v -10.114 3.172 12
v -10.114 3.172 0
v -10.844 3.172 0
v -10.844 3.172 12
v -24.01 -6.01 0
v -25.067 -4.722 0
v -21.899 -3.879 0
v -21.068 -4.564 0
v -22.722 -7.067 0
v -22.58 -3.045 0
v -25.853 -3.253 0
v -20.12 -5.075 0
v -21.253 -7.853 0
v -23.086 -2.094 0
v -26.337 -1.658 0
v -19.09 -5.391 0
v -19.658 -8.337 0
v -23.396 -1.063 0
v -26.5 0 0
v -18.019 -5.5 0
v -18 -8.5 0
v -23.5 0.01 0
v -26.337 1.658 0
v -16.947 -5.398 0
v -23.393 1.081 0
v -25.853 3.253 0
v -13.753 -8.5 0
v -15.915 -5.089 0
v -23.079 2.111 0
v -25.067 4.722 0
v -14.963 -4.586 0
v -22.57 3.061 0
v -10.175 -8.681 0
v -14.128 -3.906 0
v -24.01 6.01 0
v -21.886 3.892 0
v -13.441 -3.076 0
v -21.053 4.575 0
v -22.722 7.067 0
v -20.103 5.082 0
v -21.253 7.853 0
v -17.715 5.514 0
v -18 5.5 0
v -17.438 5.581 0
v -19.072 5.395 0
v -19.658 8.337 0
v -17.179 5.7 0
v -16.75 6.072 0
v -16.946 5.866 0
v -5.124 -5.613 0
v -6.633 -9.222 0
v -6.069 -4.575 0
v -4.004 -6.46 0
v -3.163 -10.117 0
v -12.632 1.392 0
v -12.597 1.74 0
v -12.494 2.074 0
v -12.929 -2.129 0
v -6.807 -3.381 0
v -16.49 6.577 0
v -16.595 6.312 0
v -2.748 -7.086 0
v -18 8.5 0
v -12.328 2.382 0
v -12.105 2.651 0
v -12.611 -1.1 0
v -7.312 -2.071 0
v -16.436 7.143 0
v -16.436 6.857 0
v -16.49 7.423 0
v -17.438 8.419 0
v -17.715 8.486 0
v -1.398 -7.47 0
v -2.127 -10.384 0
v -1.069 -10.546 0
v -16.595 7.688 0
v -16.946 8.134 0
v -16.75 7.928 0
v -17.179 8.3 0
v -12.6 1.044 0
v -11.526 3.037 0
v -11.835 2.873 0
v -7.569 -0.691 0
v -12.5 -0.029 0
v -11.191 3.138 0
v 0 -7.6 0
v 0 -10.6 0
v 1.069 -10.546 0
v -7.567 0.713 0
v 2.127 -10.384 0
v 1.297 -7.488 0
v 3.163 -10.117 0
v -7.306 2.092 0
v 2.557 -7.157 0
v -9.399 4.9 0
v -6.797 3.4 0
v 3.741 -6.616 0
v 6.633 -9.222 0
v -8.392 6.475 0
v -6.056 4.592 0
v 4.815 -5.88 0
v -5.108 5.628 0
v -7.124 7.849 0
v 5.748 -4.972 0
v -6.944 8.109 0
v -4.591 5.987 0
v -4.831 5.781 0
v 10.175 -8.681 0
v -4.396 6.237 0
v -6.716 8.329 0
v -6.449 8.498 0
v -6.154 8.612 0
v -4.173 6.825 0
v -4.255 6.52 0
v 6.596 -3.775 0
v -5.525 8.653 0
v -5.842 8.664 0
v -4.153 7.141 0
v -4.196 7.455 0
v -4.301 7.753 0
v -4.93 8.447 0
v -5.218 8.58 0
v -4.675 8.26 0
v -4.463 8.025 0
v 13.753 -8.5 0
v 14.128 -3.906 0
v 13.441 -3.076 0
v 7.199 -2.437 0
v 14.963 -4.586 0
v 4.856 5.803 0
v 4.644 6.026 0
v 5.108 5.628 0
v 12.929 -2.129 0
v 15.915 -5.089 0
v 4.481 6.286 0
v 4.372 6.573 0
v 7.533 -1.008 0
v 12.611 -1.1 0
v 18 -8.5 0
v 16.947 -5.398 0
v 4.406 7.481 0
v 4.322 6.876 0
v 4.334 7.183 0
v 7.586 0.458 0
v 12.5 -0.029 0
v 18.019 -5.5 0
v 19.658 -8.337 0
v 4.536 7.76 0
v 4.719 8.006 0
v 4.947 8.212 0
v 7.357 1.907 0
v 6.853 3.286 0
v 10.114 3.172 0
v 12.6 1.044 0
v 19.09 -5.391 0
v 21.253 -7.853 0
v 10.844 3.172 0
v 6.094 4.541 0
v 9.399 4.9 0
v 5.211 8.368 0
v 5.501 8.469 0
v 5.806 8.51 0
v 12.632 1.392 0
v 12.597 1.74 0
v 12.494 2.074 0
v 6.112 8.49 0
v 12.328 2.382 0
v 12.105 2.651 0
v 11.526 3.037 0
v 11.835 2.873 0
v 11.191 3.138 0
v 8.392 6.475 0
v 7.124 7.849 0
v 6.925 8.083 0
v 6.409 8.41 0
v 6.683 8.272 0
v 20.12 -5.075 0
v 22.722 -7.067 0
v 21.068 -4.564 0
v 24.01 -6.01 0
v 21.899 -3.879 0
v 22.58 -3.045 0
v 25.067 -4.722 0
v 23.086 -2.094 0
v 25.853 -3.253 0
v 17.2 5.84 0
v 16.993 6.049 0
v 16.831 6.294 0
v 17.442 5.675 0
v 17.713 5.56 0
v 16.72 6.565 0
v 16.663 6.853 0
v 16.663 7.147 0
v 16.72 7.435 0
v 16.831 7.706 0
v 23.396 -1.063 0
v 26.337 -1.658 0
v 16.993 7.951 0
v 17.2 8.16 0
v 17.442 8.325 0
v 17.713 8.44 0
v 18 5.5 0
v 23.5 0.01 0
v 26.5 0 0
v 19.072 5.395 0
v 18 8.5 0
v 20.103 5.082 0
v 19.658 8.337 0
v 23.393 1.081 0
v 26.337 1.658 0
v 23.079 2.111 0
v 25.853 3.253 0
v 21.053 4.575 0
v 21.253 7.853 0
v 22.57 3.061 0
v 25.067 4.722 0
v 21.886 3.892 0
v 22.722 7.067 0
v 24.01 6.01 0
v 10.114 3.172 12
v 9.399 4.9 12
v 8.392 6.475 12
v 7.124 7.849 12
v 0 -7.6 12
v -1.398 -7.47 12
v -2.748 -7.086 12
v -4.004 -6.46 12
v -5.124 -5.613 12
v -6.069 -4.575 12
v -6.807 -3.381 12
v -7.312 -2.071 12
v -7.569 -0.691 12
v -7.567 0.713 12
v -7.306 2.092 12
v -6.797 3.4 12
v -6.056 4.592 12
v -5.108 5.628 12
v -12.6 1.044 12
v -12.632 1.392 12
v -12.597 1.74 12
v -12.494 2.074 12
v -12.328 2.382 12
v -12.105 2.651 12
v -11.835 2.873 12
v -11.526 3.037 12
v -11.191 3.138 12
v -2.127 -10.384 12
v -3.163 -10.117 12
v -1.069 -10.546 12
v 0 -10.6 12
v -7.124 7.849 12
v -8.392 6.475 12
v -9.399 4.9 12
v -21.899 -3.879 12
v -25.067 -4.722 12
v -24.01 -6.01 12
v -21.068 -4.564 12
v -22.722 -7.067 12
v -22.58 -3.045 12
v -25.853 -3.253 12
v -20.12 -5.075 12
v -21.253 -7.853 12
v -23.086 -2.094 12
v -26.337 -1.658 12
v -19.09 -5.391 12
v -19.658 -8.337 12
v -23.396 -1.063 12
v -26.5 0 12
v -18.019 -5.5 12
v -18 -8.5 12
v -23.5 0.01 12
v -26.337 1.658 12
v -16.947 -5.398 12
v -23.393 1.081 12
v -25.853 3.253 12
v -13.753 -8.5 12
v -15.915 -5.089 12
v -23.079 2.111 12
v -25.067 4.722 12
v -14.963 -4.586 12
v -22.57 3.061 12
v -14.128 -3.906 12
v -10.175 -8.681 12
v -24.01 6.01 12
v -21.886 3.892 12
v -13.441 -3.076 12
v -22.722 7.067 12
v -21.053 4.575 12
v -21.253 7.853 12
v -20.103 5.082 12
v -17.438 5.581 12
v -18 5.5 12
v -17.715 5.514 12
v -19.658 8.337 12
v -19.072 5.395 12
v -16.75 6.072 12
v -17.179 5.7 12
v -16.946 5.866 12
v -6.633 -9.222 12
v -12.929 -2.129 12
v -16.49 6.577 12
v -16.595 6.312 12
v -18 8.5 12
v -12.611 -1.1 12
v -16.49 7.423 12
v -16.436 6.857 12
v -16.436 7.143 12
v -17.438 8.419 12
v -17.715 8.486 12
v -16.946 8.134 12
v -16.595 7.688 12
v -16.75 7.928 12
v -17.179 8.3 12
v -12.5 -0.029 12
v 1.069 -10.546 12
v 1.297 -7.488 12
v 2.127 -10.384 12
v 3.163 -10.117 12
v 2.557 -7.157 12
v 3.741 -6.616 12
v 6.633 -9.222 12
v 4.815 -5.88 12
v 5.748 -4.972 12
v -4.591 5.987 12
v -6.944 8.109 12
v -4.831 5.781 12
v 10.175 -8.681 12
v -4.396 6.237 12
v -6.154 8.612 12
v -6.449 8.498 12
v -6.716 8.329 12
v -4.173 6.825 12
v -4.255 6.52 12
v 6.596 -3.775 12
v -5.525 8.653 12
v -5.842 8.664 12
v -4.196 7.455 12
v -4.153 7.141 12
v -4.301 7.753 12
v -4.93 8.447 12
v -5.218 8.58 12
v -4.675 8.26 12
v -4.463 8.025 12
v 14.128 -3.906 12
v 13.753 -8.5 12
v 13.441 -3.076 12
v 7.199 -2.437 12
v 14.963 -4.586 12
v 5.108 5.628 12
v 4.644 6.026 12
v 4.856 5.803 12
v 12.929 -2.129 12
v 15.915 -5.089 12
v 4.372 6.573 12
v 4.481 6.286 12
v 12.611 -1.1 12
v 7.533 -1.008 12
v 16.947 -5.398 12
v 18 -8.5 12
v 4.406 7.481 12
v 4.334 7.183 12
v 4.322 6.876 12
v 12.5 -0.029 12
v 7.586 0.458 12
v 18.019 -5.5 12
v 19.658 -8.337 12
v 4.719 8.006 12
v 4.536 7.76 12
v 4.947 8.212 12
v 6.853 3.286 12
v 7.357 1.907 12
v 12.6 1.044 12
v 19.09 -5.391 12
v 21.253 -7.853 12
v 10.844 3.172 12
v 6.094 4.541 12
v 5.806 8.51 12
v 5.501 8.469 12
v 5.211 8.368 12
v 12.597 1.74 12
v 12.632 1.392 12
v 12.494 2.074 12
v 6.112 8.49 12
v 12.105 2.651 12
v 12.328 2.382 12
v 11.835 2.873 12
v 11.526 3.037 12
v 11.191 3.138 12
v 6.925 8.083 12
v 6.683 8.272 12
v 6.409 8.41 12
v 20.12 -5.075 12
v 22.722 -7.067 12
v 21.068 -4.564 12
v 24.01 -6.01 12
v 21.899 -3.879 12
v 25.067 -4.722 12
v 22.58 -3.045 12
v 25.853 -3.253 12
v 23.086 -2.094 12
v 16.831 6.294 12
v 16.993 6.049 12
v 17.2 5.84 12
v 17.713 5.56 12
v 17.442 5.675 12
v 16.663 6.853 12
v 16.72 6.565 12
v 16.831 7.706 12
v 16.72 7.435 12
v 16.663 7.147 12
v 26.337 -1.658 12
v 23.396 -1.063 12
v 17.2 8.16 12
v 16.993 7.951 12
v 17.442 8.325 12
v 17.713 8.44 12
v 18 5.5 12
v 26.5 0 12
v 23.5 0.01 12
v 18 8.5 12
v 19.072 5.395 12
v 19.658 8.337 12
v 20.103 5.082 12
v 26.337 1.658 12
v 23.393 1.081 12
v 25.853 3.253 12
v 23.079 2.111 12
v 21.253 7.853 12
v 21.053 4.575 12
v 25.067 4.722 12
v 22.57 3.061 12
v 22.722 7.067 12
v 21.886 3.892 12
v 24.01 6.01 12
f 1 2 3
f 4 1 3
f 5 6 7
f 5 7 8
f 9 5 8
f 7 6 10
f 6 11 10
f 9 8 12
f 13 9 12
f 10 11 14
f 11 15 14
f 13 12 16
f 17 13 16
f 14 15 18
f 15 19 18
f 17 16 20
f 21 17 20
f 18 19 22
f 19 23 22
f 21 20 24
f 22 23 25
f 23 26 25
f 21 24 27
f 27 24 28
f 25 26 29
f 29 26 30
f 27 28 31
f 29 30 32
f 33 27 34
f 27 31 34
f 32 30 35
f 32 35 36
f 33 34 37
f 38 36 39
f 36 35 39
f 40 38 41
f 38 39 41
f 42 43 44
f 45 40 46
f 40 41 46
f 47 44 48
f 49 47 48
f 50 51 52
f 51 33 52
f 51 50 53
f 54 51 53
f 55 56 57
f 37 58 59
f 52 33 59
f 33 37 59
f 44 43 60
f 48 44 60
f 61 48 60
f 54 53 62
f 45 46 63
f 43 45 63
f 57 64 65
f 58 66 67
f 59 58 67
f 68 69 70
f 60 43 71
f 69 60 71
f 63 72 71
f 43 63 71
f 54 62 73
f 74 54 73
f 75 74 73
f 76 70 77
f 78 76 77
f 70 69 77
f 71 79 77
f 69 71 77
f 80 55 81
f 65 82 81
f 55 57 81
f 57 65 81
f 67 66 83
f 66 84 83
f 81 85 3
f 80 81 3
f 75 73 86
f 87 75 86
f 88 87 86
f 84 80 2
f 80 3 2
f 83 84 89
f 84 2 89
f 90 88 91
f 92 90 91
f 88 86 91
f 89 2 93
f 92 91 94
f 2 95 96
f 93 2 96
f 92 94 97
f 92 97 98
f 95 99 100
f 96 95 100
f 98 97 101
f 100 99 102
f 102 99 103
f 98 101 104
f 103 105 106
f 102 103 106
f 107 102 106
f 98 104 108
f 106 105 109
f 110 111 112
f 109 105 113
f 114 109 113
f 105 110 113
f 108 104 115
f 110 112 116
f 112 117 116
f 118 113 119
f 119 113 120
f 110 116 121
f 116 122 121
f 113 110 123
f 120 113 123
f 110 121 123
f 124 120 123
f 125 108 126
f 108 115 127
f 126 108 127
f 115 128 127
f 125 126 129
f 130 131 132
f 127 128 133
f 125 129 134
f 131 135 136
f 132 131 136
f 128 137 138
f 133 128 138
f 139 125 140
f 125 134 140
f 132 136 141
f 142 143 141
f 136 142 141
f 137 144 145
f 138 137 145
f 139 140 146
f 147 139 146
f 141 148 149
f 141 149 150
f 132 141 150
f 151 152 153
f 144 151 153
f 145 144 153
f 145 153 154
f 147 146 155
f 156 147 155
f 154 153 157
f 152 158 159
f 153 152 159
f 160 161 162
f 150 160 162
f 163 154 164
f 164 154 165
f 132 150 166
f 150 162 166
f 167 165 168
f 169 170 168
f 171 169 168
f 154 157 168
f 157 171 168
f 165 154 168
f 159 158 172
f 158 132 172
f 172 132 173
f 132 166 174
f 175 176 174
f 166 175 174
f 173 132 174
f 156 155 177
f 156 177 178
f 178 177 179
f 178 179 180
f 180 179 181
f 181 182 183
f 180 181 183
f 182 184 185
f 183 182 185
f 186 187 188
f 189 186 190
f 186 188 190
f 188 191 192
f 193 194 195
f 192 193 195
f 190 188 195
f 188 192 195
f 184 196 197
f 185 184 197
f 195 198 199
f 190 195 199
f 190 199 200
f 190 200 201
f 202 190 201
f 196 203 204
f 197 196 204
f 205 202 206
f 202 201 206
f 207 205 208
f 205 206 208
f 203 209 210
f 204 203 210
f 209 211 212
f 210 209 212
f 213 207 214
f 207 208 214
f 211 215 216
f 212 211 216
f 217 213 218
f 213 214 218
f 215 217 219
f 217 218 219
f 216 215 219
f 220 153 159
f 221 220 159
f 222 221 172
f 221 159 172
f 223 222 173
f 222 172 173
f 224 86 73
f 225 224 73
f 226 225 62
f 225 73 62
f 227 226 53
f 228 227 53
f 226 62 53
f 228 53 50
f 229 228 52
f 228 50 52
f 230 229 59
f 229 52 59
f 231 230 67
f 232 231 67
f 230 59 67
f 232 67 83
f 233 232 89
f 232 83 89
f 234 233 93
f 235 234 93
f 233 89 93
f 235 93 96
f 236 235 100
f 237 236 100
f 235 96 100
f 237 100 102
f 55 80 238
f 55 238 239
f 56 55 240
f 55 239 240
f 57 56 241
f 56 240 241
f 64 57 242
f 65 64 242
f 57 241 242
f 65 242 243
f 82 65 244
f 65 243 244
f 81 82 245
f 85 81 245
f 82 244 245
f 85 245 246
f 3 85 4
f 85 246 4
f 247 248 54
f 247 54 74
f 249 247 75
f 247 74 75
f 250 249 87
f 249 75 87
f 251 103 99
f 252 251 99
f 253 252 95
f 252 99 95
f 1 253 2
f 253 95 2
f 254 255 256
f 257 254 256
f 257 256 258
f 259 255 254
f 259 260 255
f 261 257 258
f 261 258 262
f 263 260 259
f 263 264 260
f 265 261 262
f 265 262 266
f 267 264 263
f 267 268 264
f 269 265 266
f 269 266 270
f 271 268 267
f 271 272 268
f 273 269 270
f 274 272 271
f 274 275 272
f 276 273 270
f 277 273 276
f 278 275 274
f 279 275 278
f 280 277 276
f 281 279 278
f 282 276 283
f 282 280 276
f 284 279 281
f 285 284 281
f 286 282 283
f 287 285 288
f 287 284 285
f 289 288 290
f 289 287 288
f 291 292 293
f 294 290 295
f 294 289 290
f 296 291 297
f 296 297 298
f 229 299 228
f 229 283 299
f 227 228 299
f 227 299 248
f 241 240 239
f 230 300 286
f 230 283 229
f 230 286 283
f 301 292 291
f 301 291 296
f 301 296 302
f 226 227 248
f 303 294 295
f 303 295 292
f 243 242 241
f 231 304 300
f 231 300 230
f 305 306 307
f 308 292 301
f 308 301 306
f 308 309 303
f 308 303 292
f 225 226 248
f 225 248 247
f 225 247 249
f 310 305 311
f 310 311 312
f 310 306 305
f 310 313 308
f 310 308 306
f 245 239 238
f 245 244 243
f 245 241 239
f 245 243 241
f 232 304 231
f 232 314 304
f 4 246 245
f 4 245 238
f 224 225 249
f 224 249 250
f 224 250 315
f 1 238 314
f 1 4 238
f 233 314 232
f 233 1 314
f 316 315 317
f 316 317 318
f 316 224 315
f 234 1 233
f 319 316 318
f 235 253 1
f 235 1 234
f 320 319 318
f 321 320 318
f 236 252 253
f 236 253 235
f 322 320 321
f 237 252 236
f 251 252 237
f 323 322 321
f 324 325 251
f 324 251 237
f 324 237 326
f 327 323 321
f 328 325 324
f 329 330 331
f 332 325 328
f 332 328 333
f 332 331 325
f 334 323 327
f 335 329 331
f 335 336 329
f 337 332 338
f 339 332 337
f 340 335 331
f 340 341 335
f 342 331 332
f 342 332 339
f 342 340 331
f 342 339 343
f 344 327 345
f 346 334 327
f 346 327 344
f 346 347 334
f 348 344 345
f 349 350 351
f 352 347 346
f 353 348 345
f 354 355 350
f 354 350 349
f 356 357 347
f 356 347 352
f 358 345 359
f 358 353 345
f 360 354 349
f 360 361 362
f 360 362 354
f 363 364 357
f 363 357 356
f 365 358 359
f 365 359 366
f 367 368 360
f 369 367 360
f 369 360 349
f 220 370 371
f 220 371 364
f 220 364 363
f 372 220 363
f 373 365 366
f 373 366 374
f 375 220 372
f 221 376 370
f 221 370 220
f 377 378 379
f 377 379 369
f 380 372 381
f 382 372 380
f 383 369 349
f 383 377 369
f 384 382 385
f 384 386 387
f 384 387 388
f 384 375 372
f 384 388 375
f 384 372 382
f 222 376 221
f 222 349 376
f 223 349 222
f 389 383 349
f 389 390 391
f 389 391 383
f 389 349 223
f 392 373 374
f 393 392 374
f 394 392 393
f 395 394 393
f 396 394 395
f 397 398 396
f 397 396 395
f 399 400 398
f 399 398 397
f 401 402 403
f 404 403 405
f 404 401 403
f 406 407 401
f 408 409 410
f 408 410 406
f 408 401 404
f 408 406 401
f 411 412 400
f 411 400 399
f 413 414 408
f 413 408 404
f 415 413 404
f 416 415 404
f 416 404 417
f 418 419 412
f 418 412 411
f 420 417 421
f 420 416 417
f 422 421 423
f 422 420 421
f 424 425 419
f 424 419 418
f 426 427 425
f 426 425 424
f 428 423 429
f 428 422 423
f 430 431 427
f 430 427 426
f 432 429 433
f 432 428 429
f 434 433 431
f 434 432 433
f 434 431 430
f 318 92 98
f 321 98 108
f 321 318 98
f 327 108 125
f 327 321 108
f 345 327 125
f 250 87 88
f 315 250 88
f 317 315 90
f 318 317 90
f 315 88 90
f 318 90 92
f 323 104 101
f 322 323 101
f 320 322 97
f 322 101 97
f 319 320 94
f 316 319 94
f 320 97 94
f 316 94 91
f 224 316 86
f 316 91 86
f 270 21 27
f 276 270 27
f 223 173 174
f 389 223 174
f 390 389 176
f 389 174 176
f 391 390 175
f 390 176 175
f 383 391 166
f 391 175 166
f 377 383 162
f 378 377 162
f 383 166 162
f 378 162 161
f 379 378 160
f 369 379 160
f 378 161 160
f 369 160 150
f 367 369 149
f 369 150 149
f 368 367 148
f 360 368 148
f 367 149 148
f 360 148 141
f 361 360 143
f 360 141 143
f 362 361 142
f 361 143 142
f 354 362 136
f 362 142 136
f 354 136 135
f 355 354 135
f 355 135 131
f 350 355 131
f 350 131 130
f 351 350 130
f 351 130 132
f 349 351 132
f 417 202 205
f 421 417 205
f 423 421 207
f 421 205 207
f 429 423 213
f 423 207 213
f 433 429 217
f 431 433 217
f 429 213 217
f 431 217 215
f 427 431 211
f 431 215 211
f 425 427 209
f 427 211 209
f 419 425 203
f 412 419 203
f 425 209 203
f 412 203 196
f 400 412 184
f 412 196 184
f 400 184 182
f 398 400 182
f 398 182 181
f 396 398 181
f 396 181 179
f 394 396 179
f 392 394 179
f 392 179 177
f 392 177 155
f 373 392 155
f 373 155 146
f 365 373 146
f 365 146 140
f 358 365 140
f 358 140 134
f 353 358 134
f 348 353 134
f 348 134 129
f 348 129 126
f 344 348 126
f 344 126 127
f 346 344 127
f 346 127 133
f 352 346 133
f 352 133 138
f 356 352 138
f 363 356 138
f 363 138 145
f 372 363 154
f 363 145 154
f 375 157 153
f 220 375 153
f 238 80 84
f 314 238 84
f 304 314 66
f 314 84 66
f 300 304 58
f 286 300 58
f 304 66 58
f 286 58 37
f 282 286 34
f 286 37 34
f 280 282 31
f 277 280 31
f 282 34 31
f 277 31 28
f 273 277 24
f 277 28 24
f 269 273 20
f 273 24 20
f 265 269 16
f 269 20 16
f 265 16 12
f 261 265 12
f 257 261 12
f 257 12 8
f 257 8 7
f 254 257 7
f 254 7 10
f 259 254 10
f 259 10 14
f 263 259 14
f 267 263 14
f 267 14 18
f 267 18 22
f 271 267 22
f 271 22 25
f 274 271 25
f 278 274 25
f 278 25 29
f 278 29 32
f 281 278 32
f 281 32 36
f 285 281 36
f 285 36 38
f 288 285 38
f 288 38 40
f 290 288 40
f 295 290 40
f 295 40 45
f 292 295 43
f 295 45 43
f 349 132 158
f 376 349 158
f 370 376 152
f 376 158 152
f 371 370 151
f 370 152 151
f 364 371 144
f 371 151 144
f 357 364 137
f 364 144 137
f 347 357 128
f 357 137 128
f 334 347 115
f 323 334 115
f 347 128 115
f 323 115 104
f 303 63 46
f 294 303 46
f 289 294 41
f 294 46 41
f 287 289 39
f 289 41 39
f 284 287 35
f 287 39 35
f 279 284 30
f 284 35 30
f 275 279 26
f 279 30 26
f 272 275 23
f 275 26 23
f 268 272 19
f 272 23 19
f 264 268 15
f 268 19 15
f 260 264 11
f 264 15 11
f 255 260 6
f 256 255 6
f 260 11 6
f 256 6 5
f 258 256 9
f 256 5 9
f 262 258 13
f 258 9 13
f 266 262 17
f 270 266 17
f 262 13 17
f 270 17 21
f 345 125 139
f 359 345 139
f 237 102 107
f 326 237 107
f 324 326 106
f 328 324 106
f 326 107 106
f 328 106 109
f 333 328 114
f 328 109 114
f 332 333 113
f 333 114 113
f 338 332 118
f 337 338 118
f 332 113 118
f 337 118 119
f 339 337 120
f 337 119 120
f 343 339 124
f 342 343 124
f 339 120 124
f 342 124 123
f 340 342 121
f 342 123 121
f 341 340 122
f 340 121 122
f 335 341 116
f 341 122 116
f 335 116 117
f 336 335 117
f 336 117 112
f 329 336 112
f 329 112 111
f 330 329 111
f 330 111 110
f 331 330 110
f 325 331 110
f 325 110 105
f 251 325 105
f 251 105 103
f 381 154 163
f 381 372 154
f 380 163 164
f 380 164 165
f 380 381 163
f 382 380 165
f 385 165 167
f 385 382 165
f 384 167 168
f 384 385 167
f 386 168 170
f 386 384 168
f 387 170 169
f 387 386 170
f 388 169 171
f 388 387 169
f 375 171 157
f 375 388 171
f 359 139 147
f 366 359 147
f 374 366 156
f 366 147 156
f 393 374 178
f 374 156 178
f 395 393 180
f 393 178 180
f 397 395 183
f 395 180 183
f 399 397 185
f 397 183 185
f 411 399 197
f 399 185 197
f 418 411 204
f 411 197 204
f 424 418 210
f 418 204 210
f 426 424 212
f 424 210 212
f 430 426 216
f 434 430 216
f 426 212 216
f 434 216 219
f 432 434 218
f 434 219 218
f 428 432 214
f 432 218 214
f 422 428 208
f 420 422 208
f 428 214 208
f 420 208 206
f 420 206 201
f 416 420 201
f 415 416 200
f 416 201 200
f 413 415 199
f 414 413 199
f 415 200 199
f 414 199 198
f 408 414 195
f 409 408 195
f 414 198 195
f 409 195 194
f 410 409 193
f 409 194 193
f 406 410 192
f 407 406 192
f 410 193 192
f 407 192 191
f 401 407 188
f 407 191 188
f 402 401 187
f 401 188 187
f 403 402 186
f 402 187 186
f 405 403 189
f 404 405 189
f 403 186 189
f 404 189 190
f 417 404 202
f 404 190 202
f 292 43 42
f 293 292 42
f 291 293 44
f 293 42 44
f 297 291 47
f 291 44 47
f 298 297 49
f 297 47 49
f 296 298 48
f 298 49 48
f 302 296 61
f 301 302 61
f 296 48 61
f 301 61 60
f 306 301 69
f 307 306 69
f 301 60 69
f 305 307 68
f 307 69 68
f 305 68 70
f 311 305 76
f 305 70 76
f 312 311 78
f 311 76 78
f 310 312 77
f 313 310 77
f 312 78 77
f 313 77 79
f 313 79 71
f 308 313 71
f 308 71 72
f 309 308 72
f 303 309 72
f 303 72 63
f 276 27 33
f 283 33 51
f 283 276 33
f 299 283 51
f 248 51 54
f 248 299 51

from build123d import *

# Parameters (mm, degrees)
F1_DEPTH = 12
F2_R     = 35.487136
F3_R     = 1.788944


with BuildPart() as f1:
    # F0 (on Top) → F1 (new body)
    with BuildSketch(Plane.XY):
        with BuildLine():
            Line((0, -7.6), (0, -10.6))
            ThreePointArc((0, -10.6), (3.336165, -10.061312), (6.333246, -8.5))
            Line((6.333246, -8.5), (18, -8.5))
            ThreePointArc((18, -8.5), (26.5, 0), (18, 8.5))
            Line((18, 8.5), (18, 5.5))
            ThreePointArc((18, 5.5), (20.530042, -4.883532), (13.507076, 3.172323))
            Line((13.507076, 3.172323), (10.114167, 3.172323))
            ThreePointArc((10.114167, 3.172323), (8.93073, 5.709821), (7.124192, 7.848942))
            ThreePointArc((7.124192, 7.848942), (4.718849, 8.006432), (5.107912, 5.627543))
            ThreePointArc((5.107912, 5.627543), (7.586173, 0.45824), (5.748161, -4.971785))
            ThreePointArc((5.748161, -4.971785), (3.160256, -6.911786), (0, -7.6))
        make_face()
        with BuildLine():
            Line((18, 5.5), (18, 8.5))
            ThreePointArc((18, 8.5), (16.655563, 7), (18, 5.5))
        make_face()
        with BuildLine():
            ThreePointArc((-6.333246, -8.5), (-3.336165, -10.061312), (0, -10.6))
            Line((0, -10.6), (0, -7.6))
            ThreePointArc((0, -7.6), (-7.089758, -2.737761), (-5.107912, 5.627543))
            ThreePointArc((-5.107912, 5.627543), (-4.563236, 8.147676), (-7.124192, 7.848942))
            ThreePointArc((-7.124192, 7.848942), (-8.93073, 5.709821), (-10.114167, 3.172323))
            Line((-10.114167, 3.172323), (-13.507076, 3.172323))
            ThreePointArc((-13.507076, 3.172323), (-20.530042, -4.883532), (-18, 5.5))
            Line((-18, 5.5), (-18, 8.5))
            ThreePointArc((-18, 8.5), (-26.5, 0), (-18, -8.5))
            Line((-18, -8.5), (-6.333246, -8.5))
        make_face()
        with BuildLine():
            ThreePointArc((-18, 5.5), (-16.428817, 7), (-18, 8.5))
            Line((-18, 8.5), (-18, 5.5))
        make_face()
    extrude(amount=F1_DEPTH)

    # F2
    f2_edges = [f1.edges().sort_by_distance(p)[0] for p in [
        (-6.333246, -8.5, 6),
        (6.333246, -8.5, 6),
    ]]
    fillet(f2_edges, radius=F2_R)

    # F3
    f3_edges = [f1.edges().sort_by_distance(p)[0] for p in [
        (-13.507076, 3.172323, 6),
        (13.507076, 3.172323, 6),
    ]]
    fillet(f3_edges, radius=F3_R)


solid = f1.part
